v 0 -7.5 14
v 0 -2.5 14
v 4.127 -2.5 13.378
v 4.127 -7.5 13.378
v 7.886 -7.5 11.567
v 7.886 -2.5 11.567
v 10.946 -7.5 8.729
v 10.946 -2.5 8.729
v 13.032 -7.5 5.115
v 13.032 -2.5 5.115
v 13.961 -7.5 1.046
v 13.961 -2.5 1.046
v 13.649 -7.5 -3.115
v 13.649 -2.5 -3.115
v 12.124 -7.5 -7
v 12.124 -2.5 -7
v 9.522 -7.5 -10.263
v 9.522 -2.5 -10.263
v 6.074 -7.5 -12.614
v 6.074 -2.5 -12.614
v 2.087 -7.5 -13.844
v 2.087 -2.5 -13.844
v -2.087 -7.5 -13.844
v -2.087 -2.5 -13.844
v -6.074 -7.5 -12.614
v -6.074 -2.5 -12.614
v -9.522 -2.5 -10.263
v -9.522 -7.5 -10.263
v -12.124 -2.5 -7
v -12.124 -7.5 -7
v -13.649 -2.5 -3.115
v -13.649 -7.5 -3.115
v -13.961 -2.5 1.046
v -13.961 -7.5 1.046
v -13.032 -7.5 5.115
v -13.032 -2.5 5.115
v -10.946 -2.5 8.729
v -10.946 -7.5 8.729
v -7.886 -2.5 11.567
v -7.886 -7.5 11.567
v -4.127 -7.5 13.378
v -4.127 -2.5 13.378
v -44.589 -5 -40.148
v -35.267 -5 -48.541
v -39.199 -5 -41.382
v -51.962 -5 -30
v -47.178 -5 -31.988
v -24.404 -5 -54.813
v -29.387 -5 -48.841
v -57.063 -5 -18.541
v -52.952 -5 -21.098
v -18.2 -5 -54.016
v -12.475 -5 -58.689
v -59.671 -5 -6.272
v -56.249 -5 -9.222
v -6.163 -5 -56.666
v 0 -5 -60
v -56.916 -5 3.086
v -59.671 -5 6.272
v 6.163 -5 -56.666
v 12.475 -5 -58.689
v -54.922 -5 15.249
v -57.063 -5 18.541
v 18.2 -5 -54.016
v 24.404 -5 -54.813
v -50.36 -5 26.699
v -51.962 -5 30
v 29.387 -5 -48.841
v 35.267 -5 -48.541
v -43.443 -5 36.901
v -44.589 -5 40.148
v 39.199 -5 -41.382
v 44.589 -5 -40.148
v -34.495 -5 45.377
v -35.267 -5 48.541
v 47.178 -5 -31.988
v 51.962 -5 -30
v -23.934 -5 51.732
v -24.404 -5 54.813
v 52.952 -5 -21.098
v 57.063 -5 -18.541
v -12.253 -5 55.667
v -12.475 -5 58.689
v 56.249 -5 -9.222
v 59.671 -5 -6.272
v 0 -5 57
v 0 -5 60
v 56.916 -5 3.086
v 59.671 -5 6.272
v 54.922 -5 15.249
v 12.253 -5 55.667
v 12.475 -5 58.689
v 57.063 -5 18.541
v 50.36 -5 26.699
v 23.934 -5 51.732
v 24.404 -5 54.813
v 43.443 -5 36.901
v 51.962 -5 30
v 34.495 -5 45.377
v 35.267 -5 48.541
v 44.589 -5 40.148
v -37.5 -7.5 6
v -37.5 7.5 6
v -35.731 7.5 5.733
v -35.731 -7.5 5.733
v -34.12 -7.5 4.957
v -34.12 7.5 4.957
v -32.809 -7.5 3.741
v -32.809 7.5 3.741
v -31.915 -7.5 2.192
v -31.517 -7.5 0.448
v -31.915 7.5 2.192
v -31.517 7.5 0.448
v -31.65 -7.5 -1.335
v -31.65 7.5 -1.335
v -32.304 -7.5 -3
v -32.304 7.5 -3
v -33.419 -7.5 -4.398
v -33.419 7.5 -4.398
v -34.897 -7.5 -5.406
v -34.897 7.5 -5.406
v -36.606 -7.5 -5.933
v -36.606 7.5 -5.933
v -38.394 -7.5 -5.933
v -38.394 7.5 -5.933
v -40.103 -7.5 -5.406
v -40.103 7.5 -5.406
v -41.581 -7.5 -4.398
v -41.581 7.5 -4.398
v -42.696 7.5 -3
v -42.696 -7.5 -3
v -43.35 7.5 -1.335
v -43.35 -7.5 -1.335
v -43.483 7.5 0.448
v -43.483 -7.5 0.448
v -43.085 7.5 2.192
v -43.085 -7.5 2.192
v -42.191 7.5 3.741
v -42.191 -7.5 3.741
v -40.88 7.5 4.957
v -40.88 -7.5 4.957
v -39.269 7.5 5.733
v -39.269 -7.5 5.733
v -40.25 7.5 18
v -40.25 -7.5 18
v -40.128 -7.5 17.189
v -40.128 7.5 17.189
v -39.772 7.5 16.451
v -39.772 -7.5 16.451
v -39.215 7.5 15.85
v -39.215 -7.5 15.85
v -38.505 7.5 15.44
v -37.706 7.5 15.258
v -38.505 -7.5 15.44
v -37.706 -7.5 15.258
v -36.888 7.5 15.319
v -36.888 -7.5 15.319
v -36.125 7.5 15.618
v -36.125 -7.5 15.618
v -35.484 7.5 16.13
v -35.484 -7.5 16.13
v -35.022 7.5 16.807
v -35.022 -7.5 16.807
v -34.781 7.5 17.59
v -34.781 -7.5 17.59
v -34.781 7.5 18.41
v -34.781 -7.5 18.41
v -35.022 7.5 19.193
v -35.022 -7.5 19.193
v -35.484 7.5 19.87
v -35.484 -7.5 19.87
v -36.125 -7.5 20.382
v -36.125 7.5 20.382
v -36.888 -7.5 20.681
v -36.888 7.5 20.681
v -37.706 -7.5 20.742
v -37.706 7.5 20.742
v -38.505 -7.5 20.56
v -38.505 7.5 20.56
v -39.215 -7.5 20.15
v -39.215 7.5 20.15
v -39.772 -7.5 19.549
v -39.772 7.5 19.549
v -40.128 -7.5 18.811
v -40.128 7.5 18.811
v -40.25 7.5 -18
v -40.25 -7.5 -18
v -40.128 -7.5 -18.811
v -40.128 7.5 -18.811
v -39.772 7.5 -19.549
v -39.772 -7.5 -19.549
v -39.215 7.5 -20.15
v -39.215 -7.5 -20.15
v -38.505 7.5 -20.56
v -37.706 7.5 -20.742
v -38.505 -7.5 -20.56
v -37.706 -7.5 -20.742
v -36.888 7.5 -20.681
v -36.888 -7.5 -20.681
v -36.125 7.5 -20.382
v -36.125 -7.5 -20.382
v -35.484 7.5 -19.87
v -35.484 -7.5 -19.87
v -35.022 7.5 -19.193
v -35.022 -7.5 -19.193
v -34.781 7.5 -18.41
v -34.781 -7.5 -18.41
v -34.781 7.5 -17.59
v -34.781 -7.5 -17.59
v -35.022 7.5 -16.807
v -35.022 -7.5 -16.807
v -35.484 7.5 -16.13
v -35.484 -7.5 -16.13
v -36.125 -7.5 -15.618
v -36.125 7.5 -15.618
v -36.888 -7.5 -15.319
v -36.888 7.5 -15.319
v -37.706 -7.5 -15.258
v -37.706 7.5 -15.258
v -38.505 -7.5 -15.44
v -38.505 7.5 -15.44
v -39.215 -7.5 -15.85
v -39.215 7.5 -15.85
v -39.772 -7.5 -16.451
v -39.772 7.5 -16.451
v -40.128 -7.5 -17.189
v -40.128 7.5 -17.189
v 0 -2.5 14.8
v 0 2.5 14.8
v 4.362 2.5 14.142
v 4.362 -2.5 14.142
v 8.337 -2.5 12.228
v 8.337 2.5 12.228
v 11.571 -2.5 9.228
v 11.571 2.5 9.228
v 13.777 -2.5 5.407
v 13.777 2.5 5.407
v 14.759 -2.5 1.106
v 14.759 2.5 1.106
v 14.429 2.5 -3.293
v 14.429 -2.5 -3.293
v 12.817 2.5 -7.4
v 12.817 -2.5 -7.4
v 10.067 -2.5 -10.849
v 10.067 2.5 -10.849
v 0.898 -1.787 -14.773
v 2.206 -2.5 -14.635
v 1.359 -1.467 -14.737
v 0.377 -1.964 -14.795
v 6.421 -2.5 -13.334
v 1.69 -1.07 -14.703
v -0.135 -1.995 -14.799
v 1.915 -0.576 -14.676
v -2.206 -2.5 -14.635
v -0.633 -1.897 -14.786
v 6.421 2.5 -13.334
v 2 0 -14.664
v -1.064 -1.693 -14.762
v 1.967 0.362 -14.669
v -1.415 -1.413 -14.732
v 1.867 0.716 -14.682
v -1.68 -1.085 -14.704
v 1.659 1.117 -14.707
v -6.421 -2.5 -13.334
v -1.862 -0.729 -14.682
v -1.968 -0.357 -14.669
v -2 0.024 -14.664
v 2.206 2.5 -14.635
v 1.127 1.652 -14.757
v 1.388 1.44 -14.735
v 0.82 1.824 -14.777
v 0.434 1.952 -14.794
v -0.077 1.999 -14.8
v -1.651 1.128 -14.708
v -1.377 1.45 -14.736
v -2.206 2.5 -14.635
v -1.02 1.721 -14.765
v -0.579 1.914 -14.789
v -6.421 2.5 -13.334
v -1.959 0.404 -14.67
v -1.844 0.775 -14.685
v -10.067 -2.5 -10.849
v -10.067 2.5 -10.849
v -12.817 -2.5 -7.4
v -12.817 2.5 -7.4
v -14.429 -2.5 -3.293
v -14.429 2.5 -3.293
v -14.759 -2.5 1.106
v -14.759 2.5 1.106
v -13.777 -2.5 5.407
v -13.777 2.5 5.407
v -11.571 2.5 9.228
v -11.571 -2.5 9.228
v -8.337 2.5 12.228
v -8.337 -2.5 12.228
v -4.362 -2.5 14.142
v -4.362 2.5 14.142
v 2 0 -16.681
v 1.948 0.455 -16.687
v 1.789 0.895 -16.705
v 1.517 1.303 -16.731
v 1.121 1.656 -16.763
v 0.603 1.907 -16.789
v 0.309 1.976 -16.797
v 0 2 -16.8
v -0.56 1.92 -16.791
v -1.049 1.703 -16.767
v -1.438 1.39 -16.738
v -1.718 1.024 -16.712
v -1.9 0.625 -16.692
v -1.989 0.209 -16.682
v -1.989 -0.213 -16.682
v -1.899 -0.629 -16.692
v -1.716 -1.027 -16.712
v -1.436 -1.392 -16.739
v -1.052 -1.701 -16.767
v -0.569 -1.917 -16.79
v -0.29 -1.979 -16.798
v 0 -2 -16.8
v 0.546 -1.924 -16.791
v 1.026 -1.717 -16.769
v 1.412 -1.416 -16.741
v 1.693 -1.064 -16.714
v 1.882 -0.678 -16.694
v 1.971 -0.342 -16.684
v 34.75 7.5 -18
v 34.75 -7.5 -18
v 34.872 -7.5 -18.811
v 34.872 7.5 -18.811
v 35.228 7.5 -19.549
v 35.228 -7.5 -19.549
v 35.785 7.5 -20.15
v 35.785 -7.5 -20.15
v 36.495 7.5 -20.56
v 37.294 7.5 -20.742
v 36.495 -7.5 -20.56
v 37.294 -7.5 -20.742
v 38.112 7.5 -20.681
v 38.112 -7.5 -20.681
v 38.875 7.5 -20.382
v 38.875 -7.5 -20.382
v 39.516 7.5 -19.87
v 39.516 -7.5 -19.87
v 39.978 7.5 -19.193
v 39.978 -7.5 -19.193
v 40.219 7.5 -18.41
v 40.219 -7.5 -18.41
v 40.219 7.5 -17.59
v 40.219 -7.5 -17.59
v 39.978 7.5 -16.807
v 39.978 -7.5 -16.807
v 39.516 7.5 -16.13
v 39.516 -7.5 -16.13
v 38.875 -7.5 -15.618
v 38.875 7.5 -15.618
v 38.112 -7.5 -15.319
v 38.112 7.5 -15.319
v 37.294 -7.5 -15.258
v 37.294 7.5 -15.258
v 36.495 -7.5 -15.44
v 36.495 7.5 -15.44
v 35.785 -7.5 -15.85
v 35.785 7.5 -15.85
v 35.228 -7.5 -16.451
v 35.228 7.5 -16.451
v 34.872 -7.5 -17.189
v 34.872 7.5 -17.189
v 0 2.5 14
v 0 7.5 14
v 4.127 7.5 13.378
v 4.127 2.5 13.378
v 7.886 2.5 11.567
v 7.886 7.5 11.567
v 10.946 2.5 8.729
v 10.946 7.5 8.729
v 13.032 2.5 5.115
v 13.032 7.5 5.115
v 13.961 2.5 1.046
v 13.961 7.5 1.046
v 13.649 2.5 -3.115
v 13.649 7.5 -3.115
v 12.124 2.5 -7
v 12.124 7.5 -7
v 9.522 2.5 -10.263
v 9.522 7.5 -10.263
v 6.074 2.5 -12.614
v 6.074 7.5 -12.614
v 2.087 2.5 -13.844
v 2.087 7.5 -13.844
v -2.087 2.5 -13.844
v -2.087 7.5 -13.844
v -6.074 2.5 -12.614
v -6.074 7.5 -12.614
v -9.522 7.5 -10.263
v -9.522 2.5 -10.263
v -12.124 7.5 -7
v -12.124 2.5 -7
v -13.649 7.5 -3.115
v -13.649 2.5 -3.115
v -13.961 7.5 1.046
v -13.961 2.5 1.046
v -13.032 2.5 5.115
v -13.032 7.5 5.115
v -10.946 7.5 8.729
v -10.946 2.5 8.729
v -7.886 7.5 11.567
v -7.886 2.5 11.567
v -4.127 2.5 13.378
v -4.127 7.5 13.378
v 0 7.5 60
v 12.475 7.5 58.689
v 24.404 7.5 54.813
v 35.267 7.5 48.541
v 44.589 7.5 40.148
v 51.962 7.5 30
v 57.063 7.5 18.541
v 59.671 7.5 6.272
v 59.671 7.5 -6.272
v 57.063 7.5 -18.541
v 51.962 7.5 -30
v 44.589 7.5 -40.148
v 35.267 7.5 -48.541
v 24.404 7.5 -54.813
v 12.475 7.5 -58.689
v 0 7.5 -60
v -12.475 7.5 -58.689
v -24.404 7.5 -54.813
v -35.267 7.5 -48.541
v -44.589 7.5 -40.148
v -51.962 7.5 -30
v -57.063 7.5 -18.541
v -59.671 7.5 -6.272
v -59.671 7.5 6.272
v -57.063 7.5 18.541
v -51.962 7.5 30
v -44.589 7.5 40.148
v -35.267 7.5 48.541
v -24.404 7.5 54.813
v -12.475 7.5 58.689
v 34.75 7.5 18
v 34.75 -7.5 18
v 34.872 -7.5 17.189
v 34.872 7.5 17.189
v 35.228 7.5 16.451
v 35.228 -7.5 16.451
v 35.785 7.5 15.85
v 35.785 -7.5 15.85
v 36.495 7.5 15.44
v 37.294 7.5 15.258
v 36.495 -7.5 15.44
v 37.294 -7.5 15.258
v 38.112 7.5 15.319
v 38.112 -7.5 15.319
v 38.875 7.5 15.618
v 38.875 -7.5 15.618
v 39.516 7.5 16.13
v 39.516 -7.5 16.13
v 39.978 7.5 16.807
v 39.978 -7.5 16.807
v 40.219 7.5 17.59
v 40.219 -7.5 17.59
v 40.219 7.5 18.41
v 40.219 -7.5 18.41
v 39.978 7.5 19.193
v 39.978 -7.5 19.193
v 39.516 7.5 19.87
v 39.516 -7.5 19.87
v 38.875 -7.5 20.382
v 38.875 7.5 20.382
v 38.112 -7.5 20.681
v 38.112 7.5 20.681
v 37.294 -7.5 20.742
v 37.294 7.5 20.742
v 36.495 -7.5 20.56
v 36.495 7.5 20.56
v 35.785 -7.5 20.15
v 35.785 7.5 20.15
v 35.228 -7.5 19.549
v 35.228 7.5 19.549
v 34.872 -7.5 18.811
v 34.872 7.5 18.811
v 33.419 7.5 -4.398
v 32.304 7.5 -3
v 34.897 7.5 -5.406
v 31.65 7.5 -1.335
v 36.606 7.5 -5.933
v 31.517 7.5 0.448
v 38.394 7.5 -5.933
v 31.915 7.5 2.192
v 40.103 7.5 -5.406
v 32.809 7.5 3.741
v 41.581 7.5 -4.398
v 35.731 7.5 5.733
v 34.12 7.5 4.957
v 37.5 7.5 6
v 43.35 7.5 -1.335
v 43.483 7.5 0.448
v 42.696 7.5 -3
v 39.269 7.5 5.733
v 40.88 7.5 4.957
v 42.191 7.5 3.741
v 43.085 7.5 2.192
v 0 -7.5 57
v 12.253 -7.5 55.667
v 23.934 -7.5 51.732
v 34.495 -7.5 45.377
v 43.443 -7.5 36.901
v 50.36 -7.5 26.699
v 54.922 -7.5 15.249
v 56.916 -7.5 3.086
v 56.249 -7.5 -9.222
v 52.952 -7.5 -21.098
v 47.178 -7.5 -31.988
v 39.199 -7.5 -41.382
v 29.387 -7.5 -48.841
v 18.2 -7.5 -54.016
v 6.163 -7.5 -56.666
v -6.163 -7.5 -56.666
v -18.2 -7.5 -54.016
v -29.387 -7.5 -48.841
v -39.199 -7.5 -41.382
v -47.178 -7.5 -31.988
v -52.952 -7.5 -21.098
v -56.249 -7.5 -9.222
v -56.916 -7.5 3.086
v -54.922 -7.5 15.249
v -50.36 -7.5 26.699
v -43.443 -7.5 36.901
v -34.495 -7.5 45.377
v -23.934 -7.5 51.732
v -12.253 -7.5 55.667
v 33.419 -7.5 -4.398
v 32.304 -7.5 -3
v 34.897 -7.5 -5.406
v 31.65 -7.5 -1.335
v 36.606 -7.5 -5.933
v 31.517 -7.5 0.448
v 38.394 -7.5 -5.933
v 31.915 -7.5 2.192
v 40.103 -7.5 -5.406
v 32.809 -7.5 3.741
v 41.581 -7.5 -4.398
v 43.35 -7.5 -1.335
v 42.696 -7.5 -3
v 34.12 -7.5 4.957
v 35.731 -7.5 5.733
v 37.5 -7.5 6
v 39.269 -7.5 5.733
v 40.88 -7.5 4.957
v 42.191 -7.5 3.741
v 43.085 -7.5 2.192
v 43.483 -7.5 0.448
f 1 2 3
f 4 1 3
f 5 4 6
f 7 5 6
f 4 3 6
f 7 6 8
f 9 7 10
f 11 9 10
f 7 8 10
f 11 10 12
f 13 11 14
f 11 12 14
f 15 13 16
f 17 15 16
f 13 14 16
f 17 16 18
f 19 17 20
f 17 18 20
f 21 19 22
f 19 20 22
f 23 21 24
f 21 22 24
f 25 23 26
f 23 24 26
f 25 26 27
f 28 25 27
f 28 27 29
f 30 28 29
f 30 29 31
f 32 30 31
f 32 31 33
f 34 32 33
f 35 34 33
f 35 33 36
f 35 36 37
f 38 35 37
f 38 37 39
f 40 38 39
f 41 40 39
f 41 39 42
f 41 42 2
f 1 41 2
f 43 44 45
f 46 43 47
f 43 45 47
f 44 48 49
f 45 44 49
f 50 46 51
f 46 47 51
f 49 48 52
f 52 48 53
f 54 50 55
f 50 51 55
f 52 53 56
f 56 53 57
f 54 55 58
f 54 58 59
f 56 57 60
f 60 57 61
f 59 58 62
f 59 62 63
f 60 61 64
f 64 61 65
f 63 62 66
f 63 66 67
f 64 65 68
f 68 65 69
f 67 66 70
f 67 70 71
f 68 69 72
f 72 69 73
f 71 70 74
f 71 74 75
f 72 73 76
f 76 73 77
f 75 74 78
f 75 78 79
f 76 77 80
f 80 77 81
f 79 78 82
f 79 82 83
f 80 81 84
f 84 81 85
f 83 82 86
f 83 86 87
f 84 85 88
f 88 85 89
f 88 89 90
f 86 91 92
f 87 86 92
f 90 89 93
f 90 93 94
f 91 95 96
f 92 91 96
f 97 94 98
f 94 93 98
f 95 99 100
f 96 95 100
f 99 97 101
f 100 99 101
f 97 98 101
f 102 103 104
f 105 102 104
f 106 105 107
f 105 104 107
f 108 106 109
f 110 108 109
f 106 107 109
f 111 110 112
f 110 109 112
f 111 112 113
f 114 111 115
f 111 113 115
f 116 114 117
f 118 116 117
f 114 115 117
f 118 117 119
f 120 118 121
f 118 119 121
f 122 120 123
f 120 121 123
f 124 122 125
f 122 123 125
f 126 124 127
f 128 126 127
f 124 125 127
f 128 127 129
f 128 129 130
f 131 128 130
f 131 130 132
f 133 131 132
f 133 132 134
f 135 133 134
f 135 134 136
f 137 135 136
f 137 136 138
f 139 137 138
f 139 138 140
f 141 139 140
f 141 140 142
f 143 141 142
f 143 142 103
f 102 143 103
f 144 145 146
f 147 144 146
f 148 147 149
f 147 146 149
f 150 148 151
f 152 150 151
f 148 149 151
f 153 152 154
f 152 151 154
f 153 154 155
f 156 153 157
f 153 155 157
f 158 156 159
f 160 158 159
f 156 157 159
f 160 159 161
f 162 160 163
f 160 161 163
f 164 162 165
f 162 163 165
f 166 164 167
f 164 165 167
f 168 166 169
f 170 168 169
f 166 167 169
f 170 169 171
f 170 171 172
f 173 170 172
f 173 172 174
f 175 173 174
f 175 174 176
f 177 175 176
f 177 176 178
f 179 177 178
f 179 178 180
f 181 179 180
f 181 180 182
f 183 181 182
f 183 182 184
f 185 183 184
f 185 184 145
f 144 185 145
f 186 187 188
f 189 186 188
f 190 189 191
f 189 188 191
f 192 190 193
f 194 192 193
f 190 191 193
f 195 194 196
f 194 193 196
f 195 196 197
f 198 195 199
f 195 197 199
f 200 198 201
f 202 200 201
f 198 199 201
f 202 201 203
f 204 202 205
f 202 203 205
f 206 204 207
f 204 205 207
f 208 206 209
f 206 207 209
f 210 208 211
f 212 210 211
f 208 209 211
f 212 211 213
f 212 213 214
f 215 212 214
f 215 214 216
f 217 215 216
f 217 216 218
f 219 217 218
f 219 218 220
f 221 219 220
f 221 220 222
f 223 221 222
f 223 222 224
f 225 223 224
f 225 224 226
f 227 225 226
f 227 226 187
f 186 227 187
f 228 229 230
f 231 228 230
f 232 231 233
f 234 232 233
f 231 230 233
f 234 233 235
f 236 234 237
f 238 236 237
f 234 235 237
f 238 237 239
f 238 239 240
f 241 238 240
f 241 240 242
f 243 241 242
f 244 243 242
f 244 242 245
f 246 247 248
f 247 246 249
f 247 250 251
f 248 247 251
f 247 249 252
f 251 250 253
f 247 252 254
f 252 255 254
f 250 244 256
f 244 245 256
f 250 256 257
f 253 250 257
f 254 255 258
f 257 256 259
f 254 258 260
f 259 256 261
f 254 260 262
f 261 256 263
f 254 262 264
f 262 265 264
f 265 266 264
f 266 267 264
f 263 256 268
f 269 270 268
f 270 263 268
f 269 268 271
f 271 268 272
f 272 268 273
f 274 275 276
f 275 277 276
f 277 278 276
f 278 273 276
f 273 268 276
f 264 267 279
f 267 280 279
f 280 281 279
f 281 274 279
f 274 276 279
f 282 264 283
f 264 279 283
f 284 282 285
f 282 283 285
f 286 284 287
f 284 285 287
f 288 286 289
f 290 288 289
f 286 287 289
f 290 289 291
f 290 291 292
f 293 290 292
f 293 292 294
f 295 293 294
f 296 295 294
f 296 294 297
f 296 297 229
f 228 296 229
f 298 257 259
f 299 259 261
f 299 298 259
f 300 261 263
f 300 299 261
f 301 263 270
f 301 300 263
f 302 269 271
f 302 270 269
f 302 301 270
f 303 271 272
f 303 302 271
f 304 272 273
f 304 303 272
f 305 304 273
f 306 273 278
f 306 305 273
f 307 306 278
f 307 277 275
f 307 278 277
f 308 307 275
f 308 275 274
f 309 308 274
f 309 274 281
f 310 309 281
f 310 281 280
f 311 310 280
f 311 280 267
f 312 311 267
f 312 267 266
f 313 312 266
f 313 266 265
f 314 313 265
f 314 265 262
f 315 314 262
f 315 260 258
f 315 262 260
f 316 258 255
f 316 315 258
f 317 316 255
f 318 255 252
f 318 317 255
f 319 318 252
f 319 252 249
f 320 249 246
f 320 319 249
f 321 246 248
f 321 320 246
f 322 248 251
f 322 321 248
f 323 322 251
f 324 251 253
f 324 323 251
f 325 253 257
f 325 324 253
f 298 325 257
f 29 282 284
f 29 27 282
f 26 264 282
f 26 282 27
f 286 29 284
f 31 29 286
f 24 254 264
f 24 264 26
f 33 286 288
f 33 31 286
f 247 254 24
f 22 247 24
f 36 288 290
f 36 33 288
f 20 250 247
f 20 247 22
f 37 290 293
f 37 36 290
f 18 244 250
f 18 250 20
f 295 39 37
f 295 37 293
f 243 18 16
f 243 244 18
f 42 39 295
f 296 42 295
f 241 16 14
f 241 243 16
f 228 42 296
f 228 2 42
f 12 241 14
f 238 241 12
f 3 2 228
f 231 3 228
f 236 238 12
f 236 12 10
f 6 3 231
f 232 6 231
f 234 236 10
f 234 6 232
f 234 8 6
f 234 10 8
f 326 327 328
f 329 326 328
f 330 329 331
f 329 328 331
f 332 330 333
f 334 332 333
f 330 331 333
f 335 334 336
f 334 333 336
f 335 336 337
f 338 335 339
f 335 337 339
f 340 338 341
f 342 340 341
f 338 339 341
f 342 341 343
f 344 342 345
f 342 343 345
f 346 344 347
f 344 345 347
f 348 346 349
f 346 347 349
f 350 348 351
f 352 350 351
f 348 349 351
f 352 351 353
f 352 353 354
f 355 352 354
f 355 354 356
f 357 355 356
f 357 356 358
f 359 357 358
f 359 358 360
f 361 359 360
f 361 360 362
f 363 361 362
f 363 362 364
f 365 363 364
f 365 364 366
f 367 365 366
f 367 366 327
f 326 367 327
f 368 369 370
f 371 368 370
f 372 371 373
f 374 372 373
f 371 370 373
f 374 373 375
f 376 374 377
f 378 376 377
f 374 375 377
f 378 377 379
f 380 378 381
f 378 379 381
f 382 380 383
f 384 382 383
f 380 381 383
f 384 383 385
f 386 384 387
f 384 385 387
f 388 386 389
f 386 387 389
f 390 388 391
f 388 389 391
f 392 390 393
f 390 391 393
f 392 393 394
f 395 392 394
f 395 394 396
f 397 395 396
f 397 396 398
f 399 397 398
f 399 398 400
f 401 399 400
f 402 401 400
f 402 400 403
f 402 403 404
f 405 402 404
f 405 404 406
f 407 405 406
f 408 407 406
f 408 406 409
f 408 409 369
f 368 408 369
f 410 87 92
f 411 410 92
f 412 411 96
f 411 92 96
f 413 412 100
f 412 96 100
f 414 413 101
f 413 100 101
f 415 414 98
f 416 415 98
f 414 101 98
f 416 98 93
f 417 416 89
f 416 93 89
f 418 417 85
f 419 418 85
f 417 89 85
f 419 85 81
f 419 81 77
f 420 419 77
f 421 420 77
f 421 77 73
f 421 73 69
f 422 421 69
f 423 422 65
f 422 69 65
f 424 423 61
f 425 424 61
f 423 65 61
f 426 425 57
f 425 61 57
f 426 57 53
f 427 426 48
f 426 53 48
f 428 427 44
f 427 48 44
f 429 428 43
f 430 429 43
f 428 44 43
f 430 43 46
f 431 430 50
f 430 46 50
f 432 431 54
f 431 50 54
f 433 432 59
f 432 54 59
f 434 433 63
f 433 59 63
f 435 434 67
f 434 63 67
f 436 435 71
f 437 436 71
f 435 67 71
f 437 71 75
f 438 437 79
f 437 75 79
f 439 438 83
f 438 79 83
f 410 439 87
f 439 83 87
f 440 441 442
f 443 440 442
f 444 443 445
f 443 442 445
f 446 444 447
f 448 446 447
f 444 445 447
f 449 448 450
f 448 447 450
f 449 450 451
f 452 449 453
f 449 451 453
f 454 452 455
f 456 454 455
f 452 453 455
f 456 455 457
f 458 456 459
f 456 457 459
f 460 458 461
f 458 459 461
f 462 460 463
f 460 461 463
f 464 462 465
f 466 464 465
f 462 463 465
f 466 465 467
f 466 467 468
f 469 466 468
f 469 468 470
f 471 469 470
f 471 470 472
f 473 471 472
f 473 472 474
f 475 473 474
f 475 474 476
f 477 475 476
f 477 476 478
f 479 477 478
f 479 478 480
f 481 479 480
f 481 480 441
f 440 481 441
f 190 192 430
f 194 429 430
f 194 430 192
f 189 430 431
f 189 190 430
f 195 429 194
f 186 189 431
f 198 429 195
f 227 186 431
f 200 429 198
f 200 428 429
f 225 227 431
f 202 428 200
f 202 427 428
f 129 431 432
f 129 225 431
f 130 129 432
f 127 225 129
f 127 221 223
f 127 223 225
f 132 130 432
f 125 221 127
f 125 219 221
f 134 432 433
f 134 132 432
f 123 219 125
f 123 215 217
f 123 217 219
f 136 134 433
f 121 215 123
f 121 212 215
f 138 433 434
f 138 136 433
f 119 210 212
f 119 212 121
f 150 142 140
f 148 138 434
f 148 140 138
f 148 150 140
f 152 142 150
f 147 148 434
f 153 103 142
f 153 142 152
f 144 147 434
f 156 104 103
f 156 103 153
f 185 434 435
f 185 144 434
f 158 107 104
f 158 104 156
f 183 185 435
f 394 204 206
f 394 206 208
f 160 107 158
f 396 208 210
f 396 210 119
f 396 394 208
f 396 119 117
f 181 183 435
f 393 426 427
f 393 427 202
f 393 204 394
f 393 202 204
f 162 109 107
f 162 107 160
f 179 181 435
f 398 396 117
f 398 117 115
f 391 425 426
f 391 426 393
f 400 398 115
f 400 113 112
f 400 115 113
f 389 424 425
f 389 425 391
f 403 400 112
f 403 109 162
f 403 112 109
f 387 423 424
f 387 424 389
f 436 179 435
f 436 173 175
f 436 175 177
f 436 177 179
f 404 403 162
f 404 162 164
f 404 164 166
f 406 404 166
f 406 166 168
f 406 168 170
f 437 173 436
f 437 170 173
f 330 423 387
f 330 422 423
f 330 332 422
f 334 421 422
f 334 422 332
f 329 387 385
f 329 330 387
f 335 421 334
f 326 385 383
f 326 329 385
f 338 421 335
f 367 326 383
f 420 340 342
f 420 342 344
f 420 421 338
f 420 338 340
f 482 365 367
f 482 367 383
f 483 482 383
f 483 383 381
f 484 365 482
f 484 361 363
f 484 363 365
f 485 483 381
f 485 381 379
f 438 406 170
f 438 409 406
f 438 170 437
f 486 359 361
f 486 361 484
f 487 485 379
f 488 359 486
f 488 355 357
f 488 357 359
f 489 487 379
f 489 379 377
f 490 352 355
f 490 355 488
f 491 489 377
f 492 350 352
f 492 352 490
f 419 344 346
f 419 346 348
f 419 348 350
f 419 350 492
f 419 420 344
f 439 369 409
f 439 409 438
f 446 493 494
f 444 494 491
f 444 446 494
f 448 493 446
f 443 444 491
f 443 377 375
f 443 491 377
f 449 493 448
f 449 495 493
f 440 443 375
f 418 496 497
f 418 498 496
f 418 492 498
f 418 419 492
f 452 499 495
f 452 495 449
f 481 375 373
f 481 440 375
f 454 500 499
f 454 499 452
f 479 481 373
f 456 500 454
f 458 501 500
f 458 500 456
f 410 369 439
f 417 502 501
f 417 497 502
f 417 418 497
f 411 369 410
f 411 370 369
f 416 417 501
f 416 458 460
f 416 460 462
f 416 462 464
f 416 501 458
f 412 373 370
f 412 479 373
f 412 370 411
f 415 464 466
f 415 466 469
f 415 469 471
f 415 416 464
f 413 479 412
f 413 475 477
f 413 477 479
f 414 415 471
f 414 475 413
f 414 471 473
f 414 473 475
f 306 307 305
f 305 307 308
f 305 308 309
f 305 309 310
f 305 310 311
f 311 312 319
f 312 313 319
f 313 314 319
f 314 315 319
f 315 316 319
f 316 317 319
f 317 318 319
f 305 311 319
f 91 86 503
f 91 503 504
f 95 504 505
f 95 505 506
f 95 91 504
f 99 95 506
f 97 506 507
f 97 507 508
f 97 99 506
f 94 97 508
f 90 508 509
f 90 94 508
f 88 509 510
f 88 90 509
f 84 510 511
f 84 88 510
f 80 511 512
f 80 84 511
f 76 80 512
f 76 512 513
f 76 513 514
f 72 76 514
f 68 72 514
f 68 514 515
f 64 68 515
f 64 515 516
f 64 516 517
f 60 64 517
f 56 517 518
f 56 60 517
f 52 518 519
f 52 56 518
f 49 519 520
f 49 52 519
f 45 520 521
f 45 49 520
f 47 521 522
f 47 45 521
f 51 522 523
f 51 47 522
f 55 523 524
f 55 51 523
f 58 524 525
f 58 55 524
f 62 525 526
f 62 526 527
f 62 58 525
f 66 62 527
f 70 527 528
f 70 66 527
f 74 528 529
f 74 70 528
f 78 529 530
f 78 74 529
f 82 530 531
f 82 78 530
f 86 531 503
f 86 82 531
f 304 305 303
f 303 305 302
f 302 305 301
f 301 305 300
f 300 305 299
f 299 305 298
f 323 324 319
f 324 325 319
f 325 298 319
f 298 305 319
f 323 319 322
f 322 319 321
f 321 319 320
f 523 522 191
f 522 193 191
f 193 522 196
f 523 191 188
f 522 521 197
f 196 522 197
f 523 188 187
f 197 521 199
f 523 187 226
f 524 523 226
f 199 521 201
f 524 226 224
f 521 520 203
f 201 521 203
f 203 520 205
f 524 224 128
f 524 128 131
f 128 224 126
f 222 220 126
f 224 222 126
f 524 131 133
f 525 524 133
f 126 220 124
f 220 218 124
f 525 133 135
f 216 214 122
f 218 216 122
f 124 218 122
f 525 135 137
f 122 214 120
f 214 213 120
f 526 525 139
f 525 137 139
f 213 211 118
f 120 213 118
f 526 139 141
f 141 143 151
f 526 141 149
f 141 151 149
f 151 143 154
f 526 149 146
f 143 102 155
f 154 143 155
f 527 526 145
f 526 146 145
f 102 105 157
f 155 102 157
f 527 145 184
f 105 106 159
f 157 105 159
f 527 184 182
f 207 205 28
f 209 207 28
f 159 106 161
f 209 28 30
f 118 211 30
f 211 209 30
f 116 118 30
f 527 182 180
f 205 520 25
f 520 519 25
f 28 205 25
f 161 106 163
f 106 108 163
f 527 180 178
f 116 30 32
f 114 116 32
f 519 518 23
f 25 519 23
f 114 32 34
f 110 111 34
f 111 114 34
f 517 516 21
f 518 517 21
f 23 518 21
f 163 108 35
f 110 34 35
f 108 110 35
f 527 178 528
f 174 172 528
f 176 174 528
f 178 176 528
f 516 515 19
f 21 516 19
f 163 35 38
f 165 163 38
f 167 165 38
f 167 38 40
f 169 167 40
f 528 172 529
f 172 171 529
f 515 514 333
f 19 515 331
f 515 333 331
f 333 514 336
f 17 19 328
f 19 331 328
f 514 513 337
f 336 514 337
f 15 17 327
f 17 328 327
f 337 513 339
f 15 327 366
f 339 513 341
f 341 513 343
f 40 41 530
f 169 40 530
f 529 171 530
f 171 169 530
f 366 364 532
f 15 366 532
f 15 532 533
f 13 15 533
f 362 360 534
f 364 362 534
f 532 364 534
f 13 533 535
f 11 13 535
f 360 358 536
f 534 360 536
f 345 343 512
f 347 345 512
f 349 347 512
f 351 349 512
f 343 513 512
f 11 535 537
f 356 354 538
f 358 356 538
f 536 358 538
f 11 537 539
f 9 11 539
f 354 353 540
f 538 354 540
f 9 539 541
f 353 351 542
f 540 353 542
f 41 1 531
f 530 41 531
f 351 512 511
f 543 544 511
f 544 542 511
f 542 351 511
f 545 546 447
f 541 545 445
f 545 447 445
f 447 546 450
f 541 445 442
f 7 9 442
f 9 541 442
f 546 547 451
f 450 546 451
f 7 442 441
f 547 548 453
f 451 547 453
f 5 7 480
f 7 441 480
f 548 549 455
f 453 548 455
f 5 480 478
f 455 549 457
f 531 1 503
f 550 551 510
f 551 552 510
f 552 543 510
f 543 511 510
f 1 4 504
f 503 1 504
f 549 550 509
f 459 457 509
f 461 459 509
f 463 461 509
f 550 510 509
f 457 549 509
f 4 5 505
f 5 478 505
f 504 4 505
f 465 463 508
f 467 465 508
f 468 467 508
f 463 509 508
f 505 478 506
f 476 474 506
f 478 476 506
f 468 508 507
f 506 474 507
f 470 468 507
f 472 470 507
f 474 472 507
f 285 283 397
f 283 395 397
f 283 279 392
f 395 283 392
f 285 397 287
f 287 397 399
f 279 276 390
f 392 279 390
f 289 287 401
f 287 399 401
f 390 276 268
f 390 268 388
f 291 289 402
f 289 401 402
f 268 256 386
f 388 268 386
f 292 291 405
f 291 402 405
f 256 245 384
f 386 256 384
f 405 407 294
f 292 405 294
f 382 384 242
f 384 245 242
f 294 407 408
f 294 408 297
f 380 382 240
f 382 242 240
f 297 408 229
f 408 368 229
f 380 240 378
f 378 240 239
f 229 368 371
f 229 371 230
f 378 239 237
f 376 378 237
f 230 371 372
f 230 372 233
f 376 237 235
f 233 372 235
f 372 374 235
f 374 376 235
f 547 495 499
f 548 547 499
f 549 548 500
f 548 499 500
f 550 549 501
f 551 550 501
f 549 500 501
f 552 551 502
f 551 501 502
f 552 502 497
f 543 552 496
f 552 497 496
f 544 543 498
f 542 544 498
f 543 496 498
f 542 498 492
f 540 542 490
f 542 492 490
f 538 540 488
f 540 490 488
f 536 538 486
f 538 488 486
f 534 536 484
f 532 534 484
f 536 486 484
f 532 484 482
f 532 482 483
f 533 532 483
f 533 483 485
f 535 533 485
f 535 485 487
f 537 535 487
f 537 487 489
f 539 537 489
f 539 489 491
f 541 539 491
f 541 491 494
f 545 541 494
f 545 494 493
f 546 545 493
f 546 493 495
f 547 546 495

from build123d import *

# Parameters (mm, degrees)
SKETCH1_R            = 57
EXTRUDE4_DEPTH       = 7.5
EXTRUDE5_DEPTH       = 7.5
EXTRUDE5_DEPTH_BACK  = 5
SKETCH_R             = 60
SKETCH_R_2           = 57
SKETCH2_R            = 6
SKETCH2_R_2          = 14
EXTRUDE6_DEPTH       = 87.168439698
M5_CLEARANCE_HOLE1_D = 5.5
SKETCH6_R            = 14.8
EXTRUDE7_DEPTH       = 2.5
EXTRUDE8_START       = -16.8000001
EXTRUDE8_OUTLINE_R   = 2
EXTRUDE8_DEPTH       = 2.135757978
EXTRUDE8_START_2     = -3
EXTRUDE8_2_DEPTH     = 6


with BuildPart() as part:
    # Sketch1 → Extrude4 (new, symmetric)
    with BuildSketch(Plane(origin=(0, 0, 0), x_dir=(1, 0, 0), z_dir=(0, 1, 0))):
        with Locations(Location((0, 0, 0), (0, 0, 270))):
            Circle(SKETCH1_R)
    extrude(amount=EXTRUDE4_DEPTH, both=True)

    # Sketch → Extrude5 (add, two sides: drawn at the far end of the back side and taken through both)
    with BuildSketch(Plane(origin=(0, 0, 0), x_dir=(1, 0, 0), z_dir=(0, 1, 0)).offset(-EXTRUDE5_DEPTH_BACK)):
        with Locations(Location((0, 0, 0), (0, 0, 270))):
            Circle(SKETCH_R)
        with Locations(Location((0, 0, 0), (0, 0, 270))):
            Circle(SKETCH_R_2, mode=Mode.SUBTRACT)
    extrude(amount=EXTRUDE5_DEPTH + EXTRUDE5_DEPTH_BACK)

    # Sketch2 → Extrude6 (cut, through all)
    with BuildSketch(Plane(origin=(0, 7.5, 0), x_dir=(1, 0, 0), z_dir=(0, 1, 0))):
        with Locations(Location((-37.5, 0, 0), (0, 0, 270))):
            Circle(SKETCH2_R)
        with Locations(Location((37.5, 0, 0), (0, 0, 270))):
            Circle(SKETCH2_R)
        with Locations(Location((0, 0, 0), (0, 0, 270))):
            Circle(SKETCH2_R_2)
    extrude(amount=-EXTRUDE6_DEPTH, mode=Mode.SUBTRACT)

    # M5 Clearance Hole1 (through all)
    with Locations(Plane(origin=(0, 7.5, 0), x_dir=(1, 0, 0), z_dir=(0, 1, 0))):
        with Locations((37.5, 18), (37.5, -18), (-37.5, 18), (-37.5, -18)):
            Hole(M5_CLEARANCE_HOLE1_D / 2)

    # Sketch6 → Extrude7 (cut, symmetric)
    with BuildSketch(Plane(origin=(0, 0, 0), x_dir=(1, 0, 0), z_dir=(0, 1, 0))):
        with Locations(Location((0, 0, 0), (0, 0, 270))):
            Circle(SKETCH6_R)
    extrude(amount=EXTRUDE7_DEPTH, both=True, mode=Mode.SUBTRACT)

    # Extrude8: read off the stored shape, not the designer's step
    # Extrude8 outline → Extrude8 (cut)
    with BuildSketch(Plane.XY.offset(EXTRUDE8_START)):
        Circle(EXTRUDE8_OUTLINE_R)
    extrude(amount=EXTRUDE8_DEPTH, mode=Mode.SUBTRACT)

    # Extrude8 2 outline → Extrude8 2 (add)
    with BuildSketch(Plane(origin=(0, 0, 0), x_dir=(1, 0, 0), z_dir=(0, 1, 0)).offset(EXTRUDE8_START_2)):
        with BuildLine():
            ThreePointArc((-2e-09, 16.8), (1.002059984, 16.770088723), (2.000551768, 16.680461403))
            Line((2.000551768, 16.680461403), (3, 16.56059374))
            Line((3, 16.56059374), (3, 16.8000001))
            Line((3, 16.8000001), (-2e-09, 16.8))
        make_face()
        with BuildLine():
            ThreePointArc((-2.000001192, 16.680527427), (-1.001783219, 16.770105259), (-2e-09, 16.8))
            Line((-2e-09, 16.8), (-3, 16.8000001))
            Line((-3, 16.8000001), (-3, 16.560627213))
            Line((-3, 16.560627213), (-2.000001192, 16.680527427))
        make_face()
    extrude(amount=EXTRUDE8_2_DEPTH)


solid = part.part
